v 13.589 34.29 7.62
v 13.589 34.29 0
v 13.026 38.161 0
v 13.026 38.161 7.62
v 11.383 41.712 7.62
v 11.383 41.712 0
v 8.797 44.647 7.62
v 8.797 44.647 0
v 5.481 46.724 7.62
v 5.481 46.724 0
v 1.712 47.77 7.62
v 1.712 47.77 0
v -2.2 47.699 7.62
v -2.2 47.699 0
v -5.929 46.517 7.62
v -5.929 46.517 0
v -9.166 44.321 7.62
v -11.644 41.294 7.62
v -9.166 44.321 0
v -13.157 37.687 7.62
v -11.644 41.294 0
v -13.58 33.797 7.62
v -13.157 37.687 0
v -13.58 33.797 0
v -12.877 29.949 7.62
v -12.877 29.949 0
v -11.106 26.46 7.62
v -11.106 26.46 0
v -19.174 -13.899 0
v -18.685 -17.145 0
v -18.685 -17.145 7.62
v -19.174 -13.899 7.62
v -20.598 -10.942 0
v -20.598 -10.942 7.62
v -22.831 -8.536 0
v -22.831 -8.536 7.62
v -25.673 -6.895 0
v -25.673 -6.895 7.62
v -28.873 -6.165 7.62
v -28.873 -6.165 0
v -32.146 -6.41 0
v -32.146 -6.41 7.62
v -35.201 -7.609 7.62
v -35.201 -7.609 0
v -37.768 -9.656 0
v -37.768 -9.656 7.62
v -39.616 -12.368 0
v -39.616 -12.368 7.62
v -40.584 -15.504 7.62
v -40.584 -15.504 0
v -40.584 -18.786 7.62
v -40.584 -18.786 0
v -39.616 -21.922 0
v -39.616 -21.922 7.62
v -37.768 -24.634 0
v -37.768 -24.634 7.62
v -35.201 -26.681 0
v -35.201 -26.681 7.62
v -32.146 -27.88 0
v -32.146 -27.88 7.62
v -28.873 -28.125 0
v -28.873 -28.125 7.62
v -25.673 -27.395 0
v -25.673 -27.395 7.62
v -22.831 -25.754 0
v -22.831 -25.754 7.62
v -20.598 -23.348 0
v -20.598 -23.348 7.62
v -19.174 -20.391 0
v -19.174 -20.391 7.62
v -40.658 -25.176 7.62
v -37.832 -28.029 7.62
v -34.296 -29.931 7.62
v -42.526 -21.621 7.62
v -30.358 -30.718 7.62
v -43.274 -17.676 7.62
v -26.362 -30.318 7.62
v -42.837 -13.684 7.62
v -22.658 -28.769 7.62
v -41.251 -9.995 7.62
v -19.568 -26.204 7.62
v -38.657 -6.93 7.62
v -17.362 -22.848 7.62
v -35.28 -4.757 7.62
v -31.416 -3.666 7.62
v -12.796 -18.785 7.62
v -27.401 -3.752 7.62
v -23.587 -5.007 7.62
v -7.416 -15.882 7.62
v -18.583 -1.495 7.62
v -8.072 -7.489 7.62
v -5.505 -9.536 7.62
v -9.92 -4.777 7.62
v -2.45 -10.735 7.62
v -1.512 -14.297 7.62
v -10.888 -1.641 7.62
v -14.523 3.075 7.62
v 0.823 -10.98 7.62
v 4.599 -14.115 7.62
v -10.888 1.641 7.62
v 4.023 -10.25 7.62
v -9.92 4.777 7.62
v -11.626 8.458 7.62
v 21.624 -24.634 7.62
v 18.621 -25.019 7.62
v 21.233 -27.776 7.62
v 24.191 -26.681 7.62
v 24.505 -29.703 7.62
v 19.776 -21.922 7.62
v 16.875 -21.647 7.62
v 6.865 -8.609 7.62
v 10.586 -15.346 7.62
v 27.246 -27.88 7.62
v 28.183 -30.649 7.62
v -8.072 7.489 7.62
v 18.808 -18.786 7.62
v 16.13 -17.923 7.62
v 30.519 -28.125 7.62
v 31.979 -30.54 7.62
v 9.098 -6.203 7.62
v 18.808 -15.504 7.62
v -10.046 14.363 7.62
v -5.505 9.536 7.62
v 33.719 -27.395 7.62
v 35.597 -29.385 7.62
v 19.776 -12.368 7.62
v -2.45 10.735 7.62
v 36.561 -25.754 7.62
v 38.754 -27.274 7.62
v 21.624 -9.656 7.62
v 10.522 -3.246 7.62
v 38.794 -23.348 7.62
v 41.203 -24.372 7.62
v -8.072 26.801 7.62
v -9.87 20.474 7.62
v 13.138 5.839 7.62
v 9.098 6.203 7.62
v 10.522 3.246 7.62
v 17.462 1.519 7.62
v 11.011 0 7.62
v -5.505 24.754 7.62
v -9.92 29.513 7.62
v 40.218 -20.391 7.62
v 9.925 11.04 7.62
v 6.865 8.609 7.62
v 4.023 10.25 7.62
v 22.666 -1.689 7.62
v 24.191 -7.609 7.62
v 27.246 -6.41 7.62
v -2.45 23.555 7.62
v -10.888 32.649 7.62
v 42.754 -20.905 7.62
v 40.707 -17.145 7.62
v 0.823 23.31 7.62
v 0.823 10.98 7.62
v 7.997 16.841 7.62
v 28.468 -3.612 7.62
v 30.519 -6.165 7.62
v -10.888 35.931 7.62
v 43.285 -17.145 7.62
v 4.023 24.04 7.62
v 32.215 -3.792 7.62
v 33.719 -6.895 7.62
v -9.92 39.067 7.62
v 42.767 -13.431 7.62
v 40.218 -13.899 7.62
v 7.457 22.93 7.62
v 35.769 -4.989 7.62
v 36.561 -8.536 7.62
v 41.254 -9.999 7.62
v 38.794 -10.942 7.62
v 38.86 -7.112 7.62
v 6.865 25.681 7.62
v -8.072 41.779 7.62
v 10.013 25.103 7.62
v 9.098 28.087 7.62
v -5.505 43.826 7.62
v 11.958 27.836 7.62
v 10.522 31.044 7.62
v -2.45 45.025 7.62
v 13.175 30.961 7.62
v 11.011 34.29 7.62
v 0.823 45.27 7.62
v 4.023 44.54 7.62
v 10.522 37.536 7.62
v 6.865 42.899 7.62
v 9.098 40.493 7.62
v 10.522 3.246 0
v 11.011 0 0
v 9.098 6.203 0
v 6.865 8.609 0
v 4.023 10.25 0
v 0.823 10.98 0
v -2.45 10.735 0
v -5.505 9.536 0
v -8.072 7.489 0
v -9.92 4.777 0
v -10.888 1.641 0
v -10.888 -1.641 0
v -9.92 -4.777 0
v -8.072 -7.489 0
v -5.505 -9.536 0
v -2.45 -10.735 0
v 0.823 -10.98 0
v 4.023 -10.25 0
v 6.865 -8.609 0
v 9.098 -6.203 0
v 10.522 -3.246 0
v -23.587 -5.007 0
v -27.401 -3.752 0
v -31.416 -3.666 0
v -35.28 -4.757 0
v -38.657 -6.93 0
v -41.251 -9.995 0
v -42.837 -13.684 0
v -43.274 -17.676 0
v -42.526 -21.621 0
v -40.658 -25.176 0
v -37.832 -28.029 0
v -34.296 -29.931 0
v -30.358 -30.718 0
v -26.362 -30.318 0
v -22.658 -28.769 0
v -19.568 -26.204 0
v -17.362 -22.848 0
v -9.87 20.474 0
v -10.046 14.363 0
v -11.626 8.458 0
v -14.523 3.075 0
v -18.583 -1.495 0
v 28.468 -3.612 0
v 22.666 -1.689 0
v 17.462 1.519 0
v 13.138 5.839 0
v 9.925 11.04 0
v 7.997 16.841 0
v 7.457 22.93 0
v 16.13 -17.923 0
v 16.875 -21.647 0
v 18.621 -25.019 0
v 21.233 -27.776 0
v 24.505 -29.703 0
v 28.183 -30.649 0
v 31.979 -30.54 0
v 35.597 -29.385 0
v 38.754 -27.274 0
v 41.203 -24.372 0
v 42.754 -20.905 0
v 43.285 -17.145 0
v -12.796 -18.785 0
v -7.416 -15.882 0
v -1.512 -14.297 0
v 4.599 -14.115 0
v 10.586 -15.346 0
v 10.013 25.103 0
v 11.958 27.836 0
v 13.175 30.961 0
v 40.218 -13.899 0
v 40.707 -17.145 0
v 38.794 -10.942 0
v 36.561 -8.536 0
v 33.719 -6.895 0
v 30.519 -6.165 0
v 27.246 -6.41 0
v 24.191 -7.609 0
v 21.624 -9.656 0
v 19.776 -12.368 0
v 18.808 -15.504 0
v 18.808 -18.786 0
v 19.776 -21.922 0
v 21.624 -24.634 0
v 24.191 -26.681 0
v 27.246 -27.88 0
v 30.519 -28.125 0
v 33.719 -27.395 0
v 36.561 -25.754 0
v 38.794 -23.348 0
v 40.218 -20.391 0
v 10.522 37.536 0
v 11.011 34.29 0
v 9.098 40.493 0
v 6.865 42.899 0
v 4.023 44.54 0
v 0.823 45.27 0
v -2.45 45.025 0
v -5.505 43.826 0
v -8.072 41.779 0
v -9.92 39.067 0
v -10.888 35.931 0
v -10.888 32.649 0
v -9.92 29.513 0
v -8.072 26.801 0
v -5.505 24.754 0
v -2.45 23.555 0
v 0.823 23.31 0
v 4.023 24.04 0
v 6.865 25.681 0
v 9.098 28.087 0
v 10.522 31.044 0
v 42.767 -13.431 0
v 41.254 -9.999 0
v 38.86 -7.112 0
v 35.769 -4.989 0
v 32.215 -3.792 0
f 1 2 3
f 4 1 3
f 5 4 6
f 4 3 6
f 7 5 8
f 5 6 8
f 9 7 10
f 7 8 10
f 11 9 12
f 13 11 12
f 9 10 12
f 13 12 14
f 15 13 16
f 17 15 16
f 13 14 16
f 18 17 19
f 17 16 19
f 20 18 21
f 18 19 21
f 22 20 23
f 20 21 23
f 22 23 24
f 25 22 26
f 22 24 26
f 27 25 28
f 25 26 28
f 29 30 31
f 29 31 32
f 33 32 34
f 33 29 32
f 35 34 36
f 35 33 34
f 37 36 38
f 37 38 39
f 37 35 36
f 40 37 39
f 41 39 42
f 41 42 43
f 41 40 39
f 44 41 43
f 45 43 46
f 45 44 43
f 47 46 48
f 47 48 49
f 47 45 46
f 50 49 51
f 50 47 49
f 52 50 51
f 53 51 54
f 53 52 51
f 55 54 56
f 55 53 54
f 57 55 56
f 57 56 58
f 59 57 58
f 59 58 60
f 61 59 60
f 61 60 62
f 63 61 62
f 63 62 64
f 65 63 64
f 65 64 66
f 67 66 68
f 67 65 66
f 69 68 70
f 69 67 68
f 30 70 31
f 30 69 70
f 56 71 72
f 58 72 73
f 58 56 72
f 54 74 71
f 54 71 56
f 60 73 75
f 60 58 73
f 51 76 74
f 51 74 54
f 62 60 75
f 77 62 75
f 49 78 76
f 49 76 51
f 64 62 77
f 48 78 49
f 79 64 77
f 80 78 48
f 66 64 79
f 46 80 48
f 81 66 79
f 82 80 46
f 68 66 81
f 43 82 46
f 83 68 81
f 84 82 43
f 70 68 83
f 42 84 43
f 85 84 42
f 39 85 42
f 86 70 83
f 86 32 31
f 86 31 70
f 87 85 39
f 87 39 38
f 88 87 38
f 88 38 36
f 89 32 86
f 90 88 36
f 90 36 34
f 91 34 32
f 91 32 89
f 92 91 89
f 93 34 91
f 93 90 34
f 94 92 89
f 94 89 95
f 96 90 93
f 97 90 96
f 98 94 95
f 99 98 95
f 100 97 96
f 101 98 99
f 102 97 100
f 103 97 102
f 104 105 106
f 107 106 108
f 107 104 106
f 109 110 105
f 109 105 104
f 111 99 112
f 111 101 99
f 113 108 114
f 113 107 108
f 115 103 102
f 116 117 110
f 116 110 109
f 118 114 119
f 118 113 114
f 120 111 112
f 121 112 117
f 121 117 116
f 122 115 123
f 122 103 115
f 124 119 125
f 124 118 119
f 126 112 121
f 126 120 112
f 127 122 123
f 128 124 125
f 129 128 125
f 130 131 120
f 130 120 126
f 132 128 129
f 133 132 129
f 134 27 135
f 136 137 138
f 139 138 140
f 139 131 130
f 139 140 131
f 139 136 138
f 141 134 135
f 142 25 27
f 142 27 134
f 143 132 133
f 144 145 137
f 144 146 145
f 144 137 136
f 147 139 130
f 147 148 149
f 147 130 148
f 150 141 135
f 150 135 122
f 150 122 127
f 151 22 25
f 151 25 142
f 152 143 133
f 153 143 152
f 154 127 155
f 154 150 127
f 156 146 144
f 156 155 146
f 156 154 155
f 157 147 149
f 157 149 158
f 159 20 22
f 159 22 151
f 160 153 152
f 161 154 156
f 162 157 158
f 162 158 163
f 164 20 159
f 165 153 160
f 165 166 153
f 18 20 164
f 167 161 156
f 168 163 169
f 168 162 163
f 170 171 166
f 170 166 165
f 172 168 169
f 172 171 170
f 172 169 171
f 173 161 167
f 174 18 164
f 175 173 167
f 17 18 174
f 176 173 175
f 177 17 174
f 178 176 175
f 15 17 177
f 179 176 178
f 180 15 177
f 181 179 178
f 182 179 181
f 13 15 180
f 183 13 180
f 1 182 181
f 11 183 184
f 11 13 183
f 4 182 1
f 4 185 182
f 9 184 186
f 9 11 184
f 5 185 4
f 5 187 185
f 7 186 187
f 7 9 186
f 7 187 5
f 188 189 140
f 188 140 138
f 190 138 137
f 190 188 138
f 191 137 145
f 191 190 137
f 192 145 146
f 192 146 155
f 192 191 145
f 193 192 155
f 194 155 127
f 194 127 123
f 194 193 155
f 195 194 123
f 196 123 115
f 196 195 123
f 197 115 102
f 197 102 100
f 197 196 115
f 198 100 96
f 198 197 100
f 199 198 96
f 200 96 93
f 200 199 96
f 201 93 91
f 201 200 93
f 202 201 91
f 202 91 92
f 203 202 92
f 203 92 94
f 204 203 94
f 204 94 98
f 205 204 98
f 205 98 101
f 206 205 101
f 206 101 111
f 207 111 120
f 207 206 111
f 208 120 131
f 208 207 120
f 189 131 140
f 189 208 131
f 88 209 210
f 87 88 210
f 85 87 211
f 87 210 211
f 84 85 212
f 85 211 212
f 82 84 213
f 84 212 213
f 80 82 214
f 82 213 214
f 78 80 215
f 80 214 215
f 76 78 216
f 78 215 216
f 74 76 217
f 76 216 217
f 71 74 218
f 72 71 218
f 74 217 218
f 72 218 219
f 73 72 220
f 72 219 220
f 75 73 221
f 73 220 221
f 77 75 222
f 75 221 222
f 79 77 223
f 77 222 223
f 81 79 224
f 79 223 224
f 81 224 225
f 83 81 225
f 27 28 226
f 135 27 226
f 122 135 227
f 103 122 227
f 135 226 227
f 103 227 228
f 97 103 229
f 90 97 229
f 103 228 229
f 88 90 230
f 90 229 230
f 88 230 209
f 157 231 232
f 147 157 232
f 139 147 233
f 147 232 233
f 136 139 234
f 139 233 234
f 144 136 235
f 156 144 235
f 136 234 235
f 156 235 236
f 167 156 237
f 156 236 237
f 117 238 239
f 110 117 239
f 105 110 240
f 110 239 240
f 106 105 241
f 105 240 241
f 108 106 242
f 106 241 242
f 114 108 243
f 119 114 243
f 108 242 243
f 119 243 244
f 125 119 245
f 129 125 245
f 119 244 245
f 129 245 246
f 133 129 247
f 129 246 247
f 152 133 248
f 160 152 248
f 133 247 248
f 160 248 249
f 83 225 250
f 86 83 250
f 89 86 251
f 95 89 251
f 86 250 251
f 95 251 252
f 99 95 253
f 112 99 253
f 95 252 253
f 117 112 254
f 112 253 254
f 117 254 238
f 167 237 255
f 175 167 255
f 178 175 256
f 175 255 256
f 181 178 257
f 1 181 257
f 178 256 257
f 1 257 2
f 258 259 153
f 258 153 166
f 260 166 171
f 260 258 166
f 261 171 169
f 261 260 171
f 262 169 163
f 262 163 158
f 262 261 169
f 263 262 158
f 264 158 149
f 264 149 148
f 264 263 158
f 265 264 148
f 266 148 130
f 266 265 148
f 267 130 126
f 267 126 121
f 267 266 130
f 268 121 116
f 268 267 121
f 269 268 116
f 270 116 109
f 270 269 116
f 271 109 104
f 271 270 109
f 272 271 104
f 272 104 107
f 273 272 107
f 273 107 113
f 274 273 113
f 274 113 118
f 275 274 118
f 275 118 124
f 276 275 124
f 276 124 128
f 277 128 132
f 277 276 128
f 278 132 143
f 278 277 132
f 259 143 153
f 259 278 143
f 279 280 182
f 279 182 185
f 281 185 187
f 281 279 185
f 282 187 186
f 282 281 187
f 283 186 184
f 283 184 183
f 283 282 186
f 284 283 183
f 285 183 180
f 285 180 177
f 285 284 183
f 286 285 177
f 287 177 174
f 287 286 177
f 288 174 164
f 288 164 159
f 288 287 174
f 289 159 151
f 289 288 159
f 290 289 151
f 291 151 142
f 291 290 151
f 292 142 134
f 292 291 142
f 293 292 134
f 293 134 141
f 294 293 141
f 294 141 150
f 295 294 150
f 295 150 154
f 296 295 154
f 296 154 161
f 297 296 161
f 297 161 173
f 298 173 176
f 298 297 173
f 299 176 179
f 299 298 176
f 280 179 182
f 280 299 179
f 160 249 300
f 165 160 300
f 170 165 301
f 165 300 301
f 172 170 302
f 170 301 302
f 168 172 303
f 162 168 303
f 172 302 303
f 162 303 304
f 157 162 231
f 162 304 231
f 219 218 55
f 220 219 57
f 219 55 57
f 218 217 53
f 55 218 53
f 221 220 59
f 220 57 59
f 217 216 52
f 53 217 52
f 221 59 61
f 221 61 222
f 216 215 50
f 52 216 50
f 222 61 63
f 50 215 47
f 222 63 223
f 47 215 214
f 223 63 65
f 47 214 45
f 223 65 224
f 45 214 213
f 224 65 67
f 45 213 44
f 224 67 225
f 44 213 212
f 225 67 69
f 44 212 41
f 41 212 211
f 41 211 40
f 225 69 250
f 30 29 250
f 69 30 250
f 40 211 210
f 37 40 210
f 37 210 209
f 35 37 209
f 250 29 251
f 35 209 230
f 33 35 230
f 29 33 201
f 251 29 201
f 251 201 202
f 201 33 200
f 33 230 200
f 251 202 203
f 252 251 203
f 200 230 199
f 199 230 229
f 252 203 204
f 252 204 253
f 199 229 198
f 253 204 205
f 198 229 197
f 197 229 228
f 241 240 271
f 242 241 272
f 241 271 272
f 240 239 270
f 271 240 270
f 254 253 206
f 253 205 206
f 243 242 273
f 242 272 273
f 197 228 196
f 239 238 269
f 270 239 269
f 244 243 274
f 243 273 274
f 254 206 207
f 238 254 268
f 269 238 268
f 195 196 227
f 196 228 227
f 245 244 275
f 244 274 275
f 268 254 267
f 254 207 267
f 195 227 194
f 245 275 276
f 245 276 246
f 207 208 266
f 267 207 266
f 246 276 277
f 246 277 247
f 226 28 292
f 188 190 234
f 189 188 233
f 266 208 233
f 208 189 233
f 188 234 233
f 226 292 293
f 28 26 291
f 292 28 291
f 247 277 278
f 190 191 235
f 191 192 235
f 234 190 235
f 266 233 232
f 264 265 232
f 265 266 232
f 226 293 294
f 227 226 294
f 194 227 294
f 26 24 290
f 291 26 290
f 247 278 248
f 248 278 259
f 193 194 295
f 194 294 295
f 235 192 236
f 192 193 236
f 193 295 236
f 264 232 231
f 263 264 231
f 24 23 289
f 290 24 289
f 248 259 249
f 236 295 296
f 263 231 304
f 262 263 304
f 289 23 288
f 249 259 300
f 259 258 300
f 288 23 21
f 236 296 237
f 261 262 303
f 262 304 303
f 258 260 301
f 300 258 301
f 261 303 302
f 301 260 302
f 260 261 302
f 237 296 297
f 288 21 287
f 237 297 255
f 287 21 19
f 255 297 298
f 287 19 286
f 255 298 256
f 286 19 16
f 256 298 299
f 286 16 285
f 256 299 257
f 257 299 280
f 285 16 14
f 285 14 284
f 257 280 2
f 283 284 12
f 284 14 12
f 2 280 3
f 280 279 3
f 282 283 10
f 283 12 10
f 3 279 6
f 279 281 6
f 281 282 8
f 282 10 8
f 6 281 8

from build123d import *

# Parameters (mm, degrees)
F0_R     = 11.0109
F1_DEPTH = 7.62


with BuildPart() as f1:
    # F0 (on Top) → F1 (new body)
    with BuildSketch(Plane.XY):
        with BuildLine():
            ThreePointArc((7.457027, 22.930229), (-2.538633, 20.940581), (-11.106239, 26.460369))
            ThreePointArc((-11.106239, 26.460369), (-11.625922, 8.457774), (-23.586674, -5.00714))
            ThreePointArc((-23.586674, -5.00714), (-18.127317, -10.016397), (-16.107352, -17.145))
            ThreePointArc((-16.107352, -17.145), (-16.42478, -20.064944), (-17.362233, -22.848469))
            ThreePointArc((-17.362233, -22.848469), (-1.511686, -14.29723), (16.129647, -17.923089))
            ThreePointArc((16.129647, -17.923089), (19.404391, -8.271769), (28.468471, -3.6119))
            ThreePointArc((28.468471, -3.6119), (13.137608, 5.839456), (7.457027, 22.930229))
        make_face()
        Circle(F0_R, mode=Mode.SUBTRACT)
        with BuildLine():
            ThreePointArc((43.28467, -17.145), (38.860372, -7.111748), (28.468471, -3.6119))
            ThreePointArc((28.468471, -3.6119), (19.404391, -8.271769), (16.129647, -17.923089))
            ThreePointArc((16.129647, -17.923089), (30.085215, -30.728084), (43.28467, -17.145))
        make_face()
        with Locations((29.696011, -17.145)):
            Circle(F0_R, mode=Mode.SUBTRACT)
        with BuildLine():
            ThreePointArc((-16.107352, -17.145), (-18.127317, -10.016397), (-23.586674, -5.00714))
            ThreePointArc((-23.586674, -5.00714), (-42.526264, -21.621189), (-17.362233, -22.848469))
            ThreePointArc((-17.362233, -22.848469), (-16.42478, -20.064944), (-16.107352, -17.145))
        make_face()
        with Locations((-29.696011, -17.145)):
            Circle(F0_R, mode=Mode.SUBTRACT)
        with BuildLine():
            ThreePointArc((7.457027, 22.930229), (11.957898, 27.835519), (13.588659, 34.29))
            ThreePointArc((13.588659, 34.29), (-4.10687, 47.243195), (-11.106239, 26.460369))
            ThreePointArc((-11.106239, 26.460369), (-2.538633, 20.940581), (7.457027, 22.930229))
        make_face()
        with Locations((0, 34.29)):
            Circle(F0_R, mode=Mode.SUBTRACT)
    extrude(amount=F1_DEPTH)


solid = f1.part
